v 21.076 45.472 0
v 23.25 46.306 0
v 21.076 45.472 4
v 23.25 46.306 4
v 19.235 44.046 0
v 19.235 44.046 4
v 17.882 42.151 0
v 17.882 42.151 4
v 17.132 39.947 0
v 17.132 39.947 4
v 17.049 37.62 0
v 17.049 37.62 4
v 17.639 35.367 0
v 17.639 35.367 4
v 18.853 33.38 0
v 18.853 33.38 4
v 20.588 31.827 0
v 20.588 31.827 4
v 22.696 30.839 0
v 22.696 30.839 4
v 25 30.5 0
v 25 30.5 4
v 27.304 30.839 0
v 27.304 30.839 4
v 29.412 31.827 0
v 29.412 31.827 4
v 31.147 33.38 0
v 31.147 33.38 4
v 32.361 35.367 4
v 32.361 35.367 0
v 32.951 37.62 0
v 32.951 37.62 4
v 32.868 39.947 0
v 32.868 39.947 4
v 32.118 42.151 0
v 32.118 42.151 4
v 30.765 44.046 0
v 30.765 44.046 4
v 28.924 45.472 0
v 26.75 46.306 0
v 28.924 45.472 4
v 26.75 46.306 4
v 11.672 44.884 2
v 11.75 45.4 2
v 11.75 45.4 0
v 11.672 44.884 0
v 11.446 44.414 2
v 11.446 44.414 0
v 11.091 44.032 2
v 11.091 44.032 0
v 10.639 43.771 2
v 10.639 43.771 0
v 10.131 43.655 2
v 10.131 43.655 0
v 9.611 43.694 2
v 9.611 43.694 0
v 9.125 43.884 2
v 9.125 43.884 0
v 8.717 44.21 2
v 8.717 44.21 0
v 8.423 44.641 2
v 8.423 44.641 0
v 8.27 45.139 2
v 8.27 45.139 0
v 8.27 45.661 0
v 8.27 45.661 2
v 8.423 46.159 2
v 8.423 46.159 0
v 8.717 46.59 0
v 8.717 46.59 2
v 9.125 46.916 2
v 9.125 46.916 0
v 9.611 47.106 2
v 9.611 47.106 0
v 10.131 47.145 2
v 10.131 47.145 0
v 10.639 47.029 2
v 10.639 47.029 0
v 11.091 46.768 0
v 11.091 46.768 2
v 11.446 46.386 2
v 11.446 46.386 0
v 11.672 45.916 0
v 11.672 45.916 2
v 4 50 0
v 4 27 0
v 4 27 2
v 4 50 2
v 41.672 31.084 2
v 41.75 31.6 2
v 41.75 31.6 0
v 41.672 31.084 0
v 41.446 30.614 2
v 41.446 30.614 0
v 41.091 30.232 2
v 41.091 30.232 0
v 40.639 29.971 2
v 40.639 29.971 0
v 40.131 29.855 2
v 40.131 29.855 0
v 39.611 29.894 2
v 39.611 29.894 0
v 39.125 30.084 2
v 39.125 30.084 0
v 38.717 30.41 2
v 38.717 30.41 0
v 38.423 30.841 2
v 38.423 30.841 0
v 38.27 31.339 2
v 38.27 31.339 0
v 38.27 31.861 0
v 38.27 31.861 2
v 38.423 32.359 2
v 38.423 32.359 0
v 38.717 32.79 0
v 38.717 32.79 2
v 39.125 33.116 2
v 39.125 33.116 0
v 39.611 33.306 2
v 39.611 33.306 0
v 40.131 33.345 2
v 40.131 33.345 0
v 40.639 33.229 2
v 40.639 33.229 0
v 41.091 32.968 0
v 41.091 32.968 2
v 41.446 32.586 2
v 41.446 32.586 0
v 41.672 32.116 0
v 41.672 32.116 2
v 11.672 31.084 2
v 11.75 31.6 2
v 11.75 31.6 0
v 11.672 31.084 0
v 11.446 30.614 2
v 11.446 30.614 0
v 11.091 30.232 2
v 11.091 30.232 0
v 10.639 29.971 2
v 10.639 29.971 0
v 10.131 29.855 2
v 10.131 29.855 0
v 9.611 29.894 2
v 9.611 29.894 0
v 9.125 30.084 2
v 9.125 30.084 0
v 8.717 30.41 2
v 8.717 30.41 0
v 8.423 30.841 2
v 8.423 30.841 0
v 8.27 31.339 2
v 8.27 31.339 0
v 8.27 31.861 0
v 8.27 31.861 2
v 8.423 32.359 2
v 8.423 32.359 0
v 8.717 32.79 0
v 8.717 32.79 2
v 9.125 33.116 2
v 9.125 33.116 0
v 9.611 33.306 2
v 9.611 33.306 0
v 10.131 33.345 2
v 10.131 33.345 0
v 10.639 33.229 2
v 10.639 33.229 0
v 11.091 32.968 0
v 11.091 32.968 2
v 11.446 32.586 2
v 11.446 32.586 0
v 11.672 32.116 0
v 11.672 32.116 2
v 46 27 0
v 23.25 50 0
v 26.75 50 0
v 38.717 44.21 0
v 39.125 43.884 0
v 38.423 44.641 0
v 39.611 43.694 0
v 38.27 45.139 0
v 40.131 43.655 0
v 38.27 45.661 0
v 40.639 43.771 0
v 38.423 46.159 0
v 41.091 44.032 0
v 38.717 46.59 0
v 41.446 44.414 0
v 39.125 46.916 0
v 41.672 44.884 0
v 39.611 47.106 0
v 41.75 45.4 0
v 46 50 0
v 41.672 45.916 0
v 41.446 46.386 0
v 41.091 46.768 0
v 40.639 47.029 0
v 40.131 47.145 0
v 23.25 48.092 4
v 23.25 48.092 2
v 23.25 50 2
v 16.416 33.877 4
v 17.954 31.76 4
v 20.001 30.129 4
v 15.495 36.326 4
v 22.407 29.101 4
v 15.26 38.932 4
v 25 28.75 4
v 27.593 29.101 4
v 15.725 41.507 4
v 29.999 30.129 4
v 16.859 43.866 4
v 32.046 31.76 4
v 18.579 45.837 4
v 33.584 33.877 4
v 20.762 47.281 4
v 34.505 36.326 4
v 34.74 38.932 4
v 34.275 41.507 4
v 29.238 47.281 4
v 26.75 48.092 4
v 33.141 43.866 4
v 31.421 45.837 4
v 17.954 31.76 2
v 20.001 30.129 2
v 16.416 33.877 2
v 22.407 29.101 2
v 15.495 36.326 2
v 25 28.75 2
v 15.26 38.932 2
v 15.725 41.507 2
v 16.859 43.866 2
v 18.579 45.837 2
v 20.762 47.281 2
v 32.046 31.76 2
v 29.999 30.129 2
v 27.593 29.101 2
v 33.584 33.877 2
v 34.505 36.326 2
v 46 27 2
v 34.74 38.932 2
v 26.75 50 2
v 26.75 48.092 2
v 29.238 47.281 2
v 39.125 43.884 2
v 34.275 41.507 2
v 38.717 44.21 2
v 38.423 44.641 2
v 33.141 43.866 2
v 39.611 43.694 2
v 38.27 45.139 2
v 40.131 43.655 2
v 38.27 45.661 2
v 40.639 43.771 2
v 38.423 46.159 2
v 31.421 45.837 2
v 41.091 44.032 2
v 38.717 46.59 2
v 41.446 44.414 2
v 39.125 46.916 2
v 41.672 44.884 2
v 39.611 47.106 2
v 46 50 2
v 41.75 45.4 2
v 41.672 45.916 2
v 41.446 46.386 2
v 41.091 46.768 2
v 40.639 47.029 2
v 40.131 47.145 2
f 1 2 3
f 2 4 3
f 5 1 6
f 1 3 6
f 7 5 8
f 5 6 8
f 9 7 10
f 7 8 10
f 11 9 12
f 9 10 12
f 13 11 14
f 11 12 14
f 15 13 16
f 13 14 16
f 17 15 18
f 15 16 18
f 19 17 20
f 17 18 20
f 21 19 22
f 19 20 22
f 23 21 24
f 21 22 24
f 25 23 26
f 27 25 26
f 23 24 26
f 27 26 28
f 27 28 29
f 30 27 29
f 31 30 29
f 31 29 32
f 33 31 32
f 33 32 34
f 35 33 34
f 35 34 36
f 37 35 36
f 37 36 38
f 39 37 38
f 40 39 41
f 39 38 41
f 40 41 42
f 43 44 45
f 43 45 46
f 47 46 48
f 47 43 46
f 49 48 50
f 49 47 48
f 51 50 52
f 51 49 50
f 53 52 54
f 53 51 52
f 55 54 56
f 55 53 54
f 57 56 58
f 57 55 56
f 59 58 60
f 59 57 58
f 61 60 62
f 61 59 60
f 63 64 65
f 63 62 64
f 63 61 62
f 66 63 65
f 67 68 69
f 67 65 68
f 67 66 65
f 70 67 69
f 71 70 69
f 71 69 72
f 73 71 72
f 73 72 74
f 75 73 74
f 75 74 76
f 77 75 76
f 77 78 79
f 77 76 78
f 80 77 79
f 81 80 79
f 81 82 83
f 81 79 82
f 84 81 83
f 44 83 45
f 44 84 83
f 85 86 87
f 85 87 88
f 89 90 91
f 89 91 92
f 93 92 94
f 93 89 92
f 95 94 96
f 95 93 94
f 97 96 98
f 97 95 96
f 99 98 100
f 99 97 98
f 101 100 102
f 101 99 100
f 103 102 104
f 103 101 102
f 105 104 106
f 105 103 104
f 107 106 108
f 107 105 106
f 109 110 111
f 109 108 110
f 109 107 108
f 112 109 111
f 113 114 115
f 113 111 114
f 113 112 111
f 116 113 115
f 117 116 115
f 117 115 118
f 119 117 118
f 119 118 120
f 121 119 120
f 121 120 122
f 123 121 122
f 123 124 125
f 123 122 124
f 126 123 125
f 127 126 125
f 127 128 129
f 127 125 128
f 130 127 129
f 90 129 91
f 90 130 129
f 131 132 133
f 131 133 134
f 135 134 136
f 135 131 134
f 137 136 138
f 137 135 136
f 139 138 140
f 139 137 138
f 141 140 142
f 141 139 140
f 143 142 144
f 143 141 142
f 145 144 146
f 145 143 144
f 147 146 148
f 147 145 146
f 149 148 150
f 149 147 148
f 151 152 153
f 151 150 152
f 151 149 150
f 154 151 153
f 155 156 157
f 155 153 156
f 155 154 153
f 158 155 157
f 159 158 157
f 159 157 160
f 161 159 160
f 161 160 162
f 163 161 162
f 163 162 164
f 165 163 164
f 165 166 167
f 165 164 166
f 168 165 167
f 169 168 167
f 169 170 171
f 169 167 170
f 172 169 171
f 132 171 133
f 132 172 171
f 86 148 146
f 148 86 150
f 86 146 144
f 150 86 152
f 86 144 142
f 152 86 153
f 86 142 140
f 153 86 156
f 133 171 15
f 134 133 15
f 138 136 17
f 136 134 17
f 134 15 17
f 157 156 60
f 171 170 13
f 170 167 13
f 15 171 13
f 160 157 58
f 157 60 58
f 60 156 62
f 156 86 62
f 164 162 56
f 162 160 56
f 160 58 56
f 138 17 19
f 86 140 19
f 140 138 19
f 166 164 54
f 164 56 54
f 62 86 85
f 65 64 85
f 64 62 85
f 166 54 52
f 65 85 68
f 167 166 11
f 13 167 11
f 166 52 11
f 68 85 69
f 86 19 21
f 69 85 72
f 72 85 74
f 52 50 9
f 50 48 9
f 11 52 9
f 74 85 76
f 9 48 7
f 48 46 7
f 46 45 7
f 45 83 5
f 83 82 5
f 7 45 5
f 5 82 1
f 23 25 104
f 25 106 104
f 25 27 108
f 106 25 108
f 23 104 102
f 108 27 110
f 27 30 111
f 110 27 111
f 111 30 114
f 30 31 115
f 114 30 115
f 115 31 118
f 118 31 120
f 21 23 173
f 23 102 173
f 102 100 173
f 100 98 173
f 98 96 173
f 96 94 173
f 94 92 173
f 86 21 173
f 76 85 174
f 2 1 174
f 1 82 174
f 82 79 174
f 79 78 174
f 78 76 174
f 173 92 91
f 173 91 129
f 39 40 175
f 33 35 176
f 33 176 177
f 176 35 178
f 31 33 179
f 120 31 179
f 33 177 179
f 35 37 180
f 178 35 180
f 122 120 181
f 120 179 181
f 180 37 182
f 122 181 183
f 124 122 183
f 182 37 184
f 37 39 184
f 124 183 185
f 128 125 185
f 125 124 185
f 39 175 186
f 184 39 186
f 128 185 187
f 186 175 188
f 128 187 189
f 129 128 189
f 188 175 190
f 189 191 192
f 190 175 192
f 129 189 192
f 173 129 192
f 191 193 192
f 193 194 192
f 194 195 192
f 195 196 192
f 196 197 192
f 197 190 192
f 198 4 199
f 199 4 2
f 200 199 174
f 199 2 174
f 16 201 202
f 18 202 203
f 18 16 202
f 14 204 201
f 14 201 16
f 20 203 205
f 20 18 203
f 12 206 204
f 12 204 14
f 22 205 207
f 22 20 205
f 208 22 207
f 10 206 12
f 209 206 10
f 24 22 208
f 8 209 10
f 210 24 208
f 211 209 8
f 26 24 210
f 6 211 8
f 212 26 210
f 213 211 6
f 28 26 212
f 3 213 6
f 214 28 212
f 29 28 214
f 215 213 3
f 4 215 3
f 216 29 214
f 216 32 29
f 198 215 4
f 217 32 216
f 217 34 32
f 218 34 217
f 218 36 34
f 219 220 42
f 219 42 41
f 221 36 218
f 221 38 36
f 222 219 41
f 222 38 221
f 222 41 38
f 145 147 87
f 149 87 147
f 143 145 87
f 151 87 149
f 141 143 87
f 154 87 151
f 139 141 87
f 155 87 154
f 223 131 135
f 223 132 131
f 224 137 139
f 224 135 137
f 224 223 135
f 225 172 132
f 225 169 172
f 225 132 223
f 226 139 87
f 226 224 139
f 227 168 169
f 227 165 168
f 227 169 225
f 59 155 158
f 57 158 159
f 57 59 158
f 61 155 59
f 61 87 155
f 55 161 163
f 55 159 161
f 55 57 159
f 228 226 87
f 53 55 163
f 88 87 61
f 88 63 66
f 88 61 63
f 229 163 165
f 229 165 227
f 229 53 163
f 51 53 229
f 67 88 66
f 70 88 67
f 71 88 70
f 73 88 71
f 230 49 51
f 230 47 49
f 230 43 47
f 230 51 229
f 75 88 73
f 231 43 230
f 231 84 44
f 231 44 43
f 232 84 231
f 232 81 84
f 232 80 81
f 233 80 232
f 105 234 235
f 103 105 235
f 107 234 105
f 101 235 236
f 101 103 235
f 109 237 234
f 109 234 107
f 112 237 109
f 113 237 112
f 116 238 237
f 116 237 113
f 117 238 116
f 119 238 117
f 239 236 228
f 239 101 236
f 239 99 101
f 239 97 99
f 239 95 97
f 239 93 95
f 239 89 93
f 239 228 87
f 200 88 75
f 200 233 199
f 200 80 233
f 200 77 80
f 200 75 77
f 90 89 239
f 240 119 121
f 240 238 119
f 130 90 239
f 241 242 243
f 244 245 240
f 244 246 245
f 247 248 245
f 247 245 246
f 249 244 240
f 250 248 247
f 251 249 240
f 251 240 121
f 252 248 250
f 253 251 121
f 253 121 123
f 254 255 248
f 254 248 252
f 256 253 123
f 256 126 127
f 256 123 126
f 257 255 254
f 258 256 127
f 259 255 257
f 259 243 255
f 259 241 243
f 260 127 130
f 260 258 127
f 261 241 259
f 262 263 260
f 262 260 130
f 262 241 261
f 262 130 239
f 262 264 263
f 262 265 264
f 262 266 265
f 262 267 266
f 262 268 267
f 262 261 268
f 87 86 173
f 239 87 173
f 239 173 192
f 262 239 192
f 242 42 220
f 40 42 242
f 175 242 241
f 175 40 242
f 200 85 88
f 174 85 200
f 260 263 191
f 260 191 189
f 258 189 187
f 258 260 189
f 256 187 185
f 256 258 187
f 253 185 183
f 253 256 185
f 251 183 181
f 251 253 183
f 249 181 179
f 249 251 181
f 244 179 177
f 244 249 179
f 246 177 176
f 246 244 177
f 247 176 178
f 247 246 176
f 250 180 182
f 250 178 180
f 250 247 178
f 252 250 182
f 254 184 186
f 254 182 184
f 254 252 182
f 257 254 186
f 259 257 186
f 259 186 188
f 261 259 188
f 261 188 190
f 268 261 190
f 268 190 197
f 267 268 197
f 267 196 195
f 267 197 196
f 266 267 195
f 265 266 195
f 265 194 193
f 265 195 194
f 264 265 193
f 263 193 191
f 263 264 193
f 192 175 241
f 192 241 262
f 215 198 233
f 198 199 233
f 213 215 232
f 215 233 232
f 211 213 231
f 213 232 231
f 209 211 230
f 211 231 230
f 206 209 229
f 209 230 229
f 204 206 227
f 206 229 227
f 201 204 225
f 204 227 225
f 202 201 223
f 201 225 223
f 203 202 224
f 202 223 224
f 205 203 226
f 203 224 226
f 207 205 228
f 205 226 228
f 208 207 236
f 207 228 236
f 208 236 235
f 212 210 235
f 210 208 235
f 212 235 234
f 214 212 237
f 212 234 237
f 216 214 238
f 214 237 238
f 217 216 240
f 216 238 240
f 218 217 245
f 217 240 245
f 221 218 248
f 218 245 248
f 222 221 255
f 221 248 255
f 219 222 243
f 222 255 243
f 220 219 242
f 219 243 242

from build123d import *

# Parameters (mm, degrees)
SKETCH_2_W               = 42
SKETCH_2_H               = 23
EXTRUDE_1_DEPTH          = 2
SKETCH_3_R               = 9.75
EXTRUDE_2_DEPTH          = 2
SKETCH_4_R               = 8
CUT_EXTRUDE_1_DEPTH      = 69.058798109
CUT_EXTRUDE_2_DEPTH      = 69.058798109
CUT_EXTRUDE_2_DEPTH_BACK = 69.058798109
SKETCH_5_R               = 1.75
CUT_EXTRUDE_4_REACH      = 70.059
SKETCH_7_W               = 3.5
SKETCH_7_H               = 14.451393072


with BuildPart() as part:
    # 草图2 → 凸台-拉伸1 (new body)
    with BuildSketch(Plane.XY):
        with Locations((25, 38.5)):
            Rectangle(SKETCH_2_W, SKETCH_2_H)
    extrude(amount=EXTRUDE_1_DEPTH)

    # 草图3 → 凸台-拉伸2 (add)
    with BuildSketch(Plane.XY.offset(2)):
        with Locations((25, 38.5)):
            Circle(SKETCH_3_R)
    extrude(amount=EXTRUDE_2_DEPTH)

    # 草图4 → 切除-拉伸1 (cut, through all)
    with BuildSketch(Plane.XY.offset(4)):
        with Locations((25, 38.5)):
            Circle(SKETCH_4_R)
    extrude(amount=-CUT_EXTRUDE_1_DEPTH, mode=Mode.SUBTRACT)

    # 草图5 → 切除-拉伸2 (cut, two sides: drawn at the far end of the back side and taken through both)
    with BuildSketch(Plane(origin=(0, 0, 0), x_dir=(-1, 0, 0), z_dir=(0, 0, -1)).offset(-CUT_EXTRUDE_2_DEPTH_BACK)):
        with Locations(Location((-40, 45.4, 0), (0, 0, 180))):
            Circle(SKETCH_5_R)
        with Locations(Location((-40, 31.6, 0), (0, 0, 180))):
            Circle(SKETCH_5_R)
        with Locations(Location((-10, 31.6, 0), (0, 0, 180))):
            Circle(SKETCH_5_R)
        with Locations(Location((-10, 45.4, 0), (0, 0, 180))):
            Circle(SKETCH_5_R)
    extrude(amount=CUT_EXTRUDE_2_DEPTH + CUT_EXTRUDE_2_DEPTH_BACK, mode=Mode.SUBTRACT)

    # 草图7 → 切除-拉伸4 (cut, up to next)
    with BuildSketch(Plane(origin=(0, 0, 0), x_dir=(-1, 0, 0), z_dir=(0, 0, -1)), mode=Mode.PRIVATE) as cut_extrude_4_sk1:
        with Locations((-25, 46.889165471)):
            Rectangle(SKETCH_7_W, SKETCH_7_H)
    cut_extrude_4_tool1 = extrude(cut_extrude_4_sk1.sketch, amount=-CUT_EXTRUDE_4_REACH, mode=Mode.PRIVATE) & part.part
    add(cut_extrude_4_tool1.solids().sort_by_distance((25, 46.889165, 0))[0], mode=Mode.SUBTRACT)


solid = part.part
